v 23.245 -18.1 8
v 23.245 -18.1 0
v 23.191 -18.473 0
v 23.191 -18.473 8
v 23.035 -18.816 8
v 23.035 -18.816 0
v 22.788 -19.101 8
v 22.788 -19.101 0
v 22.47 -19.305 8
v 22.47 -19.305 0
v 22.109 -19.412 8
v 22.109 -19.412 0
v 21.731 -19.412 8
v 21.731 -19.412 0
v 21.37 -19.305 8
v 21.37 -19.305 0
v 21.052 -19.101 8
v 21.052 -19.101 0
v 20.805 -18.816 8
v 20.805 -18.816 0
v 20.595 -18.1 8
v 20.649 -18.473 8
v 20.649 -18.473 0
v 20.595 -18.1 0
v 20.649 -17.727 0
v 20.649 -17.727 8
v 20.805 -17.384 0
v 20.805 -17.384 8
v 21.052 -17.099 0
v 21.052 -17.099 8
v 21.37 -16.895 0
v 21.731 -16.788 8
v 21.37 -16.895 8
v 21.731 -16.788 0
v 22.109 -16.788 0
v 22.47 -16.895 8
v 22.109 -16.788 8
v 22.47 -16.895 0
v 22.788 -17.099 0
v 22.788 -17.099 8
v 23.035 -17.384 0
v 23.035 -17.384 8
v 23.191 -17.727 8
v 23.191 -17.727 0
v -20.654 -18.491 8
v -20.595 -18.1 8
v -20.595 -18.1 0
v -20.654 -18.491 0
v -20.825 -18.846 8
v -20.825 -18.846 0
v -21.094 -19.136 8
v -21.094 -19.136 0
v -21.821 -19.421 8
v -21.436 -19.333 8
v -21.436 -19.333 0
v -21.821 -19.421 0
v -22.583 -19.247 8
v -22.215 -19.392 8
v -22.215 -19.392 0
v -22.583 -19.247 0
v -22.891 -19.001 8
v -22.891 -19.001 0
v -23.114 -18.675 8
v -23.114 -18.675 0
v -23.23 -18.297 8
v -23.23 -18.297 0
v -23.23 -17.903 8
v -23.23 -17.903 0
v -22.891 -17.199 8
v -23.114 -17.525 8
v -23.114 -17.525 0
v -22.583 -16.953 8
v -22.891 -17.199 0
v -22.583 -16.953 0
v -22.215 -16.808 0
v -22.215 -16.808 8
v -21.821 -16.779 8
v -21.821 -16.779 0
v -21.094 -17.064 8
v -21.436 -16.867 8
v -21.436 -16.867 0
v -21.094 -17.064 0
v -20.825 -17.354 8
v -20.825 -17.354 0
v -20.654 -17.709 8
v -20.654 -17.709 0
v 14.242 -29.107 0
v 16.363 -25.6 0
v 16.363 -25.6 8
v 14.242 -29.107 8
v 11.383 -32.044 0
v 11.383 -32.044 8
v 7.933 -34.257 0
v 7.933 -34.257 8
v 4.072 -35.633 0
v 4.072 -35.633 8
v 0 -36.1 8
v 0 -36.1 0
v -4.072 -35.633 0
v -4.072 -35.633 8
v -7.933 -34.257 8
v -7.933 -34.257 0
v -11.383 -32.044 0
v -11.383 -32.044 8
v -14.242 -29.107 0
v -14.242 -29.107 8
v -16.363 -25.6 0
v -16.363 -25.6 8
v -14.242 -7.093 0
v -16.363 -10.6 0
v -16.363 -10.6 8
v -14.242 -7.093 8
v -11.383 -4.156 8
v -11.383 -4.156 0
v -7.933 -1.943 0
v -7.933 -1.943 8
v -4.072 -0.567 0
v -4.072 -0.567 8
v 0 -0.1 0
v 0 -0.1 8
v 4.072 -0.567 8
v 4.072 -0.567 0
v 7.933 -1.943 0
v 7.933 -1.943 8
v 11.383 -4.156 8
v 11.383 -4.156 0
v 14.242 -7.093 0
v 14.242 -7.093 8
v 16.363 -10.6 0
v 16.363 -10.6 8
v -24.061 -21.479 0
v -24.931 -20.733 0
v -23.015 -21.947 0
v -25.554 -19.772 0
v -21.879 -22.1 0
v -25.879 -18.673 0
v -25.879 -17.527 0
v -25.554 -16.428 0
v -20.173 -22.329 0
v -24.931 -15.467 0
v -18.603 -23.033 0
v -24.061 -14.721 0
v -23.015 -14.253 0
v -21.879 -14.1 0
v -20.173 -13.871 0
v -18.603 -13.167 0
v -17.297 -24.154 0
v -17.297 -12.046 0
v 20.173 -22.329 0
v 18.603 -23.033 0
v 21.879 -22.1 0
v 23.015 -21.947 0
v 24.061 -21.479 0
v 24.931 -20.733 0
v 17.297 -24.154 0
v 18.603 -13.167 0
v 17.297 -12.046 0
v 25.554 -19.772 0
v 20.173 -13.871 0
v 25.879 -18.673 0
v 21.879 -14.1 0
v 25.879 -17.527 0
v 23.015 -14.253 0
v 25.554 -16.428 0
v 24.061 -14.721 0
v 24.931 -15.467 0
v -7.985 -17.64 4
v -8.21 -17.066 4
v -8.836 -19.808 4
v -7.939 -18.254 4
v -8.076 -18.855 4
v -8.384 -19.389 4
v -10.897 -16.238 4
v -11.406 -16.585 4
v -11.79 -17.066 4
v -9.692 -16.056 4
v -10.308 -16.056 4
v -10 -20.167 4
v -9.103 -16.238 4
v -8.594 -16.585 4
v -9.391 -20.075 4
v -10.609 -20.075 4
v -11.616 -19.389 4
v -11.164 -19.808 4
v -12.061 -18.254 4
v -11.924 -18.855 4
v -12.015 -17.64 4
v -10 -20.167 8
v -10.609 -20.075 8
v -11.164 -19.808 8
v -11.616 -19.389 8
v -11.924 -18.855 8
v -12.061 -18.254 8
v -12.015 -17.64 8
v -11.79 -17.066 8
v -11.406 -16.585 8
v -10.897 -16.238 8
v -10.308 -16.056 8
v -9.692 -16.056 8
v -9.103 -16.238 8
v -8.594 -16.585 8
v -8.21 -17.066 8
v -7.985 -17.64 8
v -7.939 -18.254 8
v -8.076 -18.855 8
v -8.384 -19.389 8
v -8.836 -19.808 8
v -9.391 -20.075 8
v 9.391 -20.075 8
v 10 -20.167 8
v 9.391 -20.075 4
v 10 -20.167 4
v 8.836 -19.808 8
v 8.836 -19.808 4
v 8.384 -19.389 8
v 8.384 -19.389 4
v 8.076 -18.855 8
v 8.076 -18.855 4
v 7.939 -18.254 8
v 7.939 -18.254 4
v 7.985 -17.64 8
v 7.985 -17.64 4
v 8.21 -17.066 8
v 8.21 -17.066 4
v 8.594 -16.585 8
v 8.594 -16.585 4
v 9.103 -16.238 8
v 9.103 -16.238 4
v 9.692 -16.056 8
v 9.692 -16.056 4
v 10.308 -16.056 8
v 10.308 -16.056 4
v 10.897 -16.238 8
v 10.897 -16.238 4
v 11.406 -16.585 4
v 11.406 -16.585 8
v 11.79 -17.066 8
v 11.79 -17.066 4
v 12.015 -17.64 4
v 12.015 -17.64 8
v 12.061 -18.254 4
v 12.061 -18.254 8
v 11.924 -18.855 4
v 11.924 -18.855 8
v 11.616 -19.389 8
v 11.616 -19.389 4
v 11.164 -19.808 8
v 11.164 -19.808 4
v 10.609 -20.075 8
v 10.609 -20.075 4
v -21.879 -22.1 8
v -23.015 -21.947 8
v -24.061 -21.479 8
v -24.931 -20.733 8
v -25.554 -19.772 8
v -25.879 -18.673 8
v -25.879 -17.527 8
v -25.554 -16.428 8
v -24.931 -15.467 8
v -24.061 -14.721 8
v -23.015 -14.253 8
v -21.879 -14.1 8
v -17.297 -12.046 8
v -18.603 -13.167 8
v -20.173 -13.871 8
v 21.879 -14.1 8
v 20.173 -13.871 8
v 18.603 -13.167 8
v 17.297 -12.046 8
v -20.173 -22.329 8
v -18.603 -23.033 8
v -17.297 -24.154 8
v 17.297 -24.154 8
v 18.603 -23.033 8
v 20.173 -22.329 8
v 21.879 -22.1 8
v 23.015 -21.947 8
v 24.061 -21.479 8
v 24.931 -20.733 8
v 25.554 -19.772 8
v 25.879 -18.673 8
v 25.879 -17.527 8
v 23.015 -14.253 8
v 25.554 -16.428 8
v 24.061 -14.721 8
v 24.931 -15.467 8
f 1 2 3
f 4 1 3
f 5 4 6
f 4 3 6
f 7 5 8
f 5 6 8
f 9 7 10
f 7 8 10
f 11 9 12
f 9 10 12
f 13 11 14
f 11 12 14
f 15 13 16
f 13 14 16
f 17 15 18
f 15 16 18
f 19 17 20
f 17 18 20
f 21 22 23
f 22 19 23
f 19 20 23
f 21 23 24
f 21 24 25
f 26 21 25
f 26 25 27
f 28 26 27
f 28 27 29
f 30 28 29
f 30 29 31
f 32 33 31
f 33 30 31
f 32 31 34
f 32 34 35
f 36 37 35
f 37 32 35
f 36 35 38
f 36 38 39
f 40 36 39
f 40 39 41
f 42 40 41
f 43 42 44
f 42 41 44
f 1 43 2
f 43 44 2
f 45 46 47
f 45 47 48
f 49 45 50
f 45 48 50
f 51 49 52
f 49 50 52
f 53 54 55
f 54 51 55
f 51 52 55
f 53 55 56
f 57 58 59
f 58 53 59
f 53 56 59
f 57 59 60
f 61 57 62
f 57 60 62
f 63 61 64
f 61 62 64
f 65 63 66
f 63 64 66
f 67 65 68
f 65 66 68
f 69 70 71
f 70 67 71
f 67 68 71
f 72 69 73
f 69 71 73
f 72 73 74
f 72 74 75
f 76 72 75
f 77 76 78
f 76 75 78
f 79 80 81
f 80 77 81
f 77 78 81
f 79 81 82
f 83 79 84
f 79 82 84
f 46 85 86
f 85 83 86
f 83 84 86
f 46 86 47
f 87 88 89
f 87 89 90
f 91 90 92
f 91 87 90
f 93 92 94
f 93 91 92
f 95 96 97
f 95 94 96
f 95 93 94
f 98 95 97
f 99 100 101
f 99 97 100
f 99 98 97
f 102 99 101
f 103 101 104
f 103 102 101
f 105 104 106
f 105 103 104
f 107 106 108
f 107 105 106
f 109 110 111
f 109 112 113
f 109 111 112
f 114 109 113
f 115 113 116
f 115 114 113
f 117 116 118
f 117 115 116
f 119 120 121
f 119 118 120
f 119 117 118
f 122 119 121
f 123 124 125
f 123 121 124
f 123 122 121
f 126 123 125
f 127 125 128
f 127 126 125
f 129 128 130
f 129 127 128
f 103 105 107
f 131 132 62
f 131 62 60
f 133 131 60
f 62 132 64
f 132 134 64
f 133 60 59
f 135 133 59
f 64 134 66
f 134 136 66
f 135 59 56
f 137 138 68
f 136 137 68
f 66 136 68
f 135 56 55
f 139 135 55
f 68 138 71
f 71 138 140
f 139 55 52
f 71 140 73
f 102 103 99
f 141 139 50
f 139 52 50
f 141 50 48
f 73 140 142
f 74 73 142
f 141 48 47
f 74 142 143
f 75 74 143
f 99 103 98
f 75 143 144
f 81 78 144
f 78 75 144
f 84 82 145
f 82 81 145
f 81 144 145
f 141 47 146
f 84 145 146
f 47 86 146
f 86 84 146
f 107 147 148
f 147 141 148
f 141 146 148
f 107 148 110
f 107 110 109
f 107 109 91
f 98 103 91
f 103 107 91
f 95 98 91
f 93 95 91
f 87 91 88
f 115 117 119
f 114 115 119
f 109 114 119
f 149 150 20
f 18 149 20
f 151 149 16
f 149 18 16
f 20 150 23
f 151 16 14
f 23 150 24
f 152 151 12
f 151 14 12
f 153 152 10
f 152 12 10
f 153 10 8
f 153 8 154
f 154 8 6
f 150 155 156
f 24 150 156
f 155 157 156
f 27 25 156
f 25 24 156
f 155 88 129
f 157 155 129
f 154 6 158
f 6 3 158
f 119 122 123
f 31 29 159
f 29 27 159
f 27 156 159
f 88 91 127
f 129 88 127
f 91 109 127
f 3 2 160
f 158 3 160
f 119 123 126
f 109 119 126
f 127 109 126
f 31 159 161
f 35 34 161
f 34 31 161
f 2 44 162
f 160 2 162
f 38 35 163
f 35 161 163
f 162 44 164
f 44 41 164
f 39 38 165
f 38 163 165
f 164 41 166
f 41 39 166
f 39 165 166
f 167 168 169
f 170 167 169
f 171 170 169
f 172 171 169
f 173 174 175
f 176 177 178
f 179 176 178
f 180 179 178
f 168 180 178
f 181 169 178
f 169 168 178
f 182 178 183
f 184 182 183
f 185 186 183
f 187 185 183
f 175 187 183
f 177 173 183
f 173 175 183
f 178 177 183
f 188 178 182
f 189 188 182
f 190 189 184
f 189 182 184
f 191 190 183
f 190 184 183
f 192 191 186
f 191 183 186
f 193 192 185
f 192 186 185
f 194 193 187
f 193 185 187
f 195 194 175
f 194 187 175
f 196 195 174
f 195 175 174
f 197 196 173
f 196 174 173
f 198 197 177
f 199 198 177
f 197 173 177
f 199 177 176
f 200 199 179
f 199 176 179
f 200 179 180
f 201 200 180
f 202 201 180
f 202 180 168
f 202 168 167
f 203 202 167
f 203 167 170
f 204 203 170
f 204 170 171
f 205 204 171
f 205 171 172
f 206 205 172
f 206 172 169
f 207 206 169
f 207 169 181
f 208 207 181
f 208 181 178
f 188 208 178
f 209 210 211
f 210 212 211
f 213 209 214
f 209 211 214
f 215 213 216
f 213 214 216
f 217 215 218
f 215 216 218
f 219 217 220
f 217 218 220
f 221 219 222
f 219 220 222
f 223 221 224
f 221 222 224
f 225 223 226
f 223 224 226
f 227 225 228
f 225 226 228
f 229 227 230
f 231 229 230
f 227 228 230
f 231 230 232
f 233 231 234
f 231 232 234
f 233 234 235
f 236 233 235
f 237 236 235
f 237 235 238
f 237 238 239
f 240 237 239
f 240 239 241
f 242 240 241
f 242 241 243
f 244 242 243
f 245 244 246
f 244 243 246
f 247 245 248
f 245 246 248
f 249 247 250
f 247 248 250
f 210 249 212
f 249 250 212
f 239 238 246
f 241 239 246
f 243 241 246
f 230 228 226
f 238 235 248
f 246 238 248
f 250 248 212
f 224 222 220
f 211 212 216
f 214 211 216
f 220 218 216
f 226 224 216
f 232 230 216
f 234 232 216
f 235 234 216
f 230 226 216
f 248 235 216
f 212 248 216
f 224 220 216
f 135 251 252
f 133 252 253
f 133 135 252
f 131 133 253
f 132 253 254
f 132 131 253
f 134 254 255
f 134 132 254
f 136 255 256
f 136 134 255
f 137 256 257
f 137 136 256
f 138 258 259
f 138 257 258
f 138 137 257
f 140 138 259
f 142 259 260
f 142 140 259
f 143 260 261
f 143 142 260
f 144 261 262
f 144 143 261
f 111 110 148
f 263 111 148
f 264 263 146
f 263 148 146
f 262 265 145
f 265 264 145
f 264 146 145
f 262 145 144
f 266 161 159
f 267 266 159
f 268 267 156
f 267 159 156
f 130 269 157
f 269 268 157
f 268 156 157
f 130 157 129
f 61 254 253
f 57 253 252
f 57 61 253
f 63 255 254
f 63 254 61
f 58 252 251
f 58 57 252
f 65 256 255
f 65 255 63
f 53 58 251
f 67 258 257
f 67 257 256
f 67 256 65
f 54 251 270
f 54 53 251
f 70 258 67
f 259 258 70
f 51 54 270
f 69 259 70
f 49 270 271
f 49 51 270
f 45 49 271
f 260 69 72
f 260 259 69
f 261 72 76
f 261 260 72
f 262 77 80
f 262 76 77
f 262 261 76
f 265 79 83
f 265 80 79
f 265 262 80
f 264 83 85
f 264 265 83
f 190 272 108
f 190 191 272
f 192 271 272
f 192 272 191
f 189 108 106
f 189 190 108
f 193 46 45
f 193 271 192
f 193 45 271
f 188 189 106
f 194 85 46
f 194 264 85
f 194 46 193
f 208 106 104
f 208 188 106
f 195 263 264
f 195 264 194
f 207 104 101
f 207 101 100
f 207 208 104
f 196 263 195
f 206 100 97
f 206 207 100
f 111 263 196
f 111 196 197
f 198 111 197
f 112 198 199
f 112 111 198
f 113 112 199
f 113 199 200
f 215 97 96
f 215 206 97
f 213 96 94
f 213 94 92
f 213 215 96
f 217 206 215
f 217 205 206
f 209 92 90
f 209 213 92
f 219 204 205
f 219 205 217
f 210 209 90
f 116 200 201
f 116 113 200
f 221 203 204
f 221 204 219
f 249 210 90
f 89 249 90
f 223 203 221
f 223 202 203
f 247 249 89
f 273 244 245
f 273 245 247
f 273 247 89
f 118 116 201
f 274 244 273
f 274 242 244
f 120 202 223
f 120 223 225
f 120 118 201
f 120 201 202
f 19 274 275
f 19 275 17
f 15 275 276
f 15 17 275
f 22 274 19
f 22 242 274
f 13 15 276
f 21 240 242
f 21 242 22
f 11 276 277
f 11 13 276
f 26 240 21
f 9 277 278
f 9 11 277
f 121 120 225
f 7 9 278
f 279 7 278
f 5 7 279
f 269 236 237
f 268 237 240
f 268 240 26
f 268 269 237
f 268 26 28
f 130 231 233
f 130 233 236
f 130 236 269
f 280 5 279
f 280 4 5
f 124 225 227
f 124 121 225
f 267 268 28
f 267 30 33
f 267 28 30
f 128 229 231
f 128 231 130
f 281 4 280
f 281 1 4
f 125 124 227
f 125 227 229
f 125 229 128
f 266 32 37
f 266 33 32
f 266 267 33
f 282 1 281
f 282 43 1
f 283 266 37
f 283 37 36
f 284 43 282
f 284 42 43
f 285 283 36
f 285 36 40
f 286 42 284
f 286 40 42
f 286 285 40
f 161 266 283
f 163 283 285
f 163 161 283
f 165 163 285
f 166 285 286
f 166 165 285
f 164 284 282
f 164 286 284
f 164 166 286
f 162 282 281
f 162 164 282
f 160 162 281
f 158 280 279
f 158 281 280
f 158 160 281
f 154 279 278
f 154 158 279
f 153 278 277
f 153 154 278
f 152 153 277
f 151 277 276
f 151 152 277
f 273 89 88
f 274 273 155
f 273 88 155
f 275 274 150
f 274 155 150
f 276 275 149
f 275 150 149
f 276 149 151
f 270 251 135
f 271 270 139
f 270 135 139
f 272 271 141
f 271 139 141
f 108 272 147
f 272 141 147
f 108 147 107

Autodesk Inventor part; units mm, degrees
ref_plane "YZ Plane" through (0, 0, 0) normal (1, 0, 0) x (0, 1, 0)
ref_plane "XZ Plane" through (0, 0, 0) normal (0, 1, 0) x (-1, 0, 0)
ref_plane "XY Plane" through (0, 0, 0) normal (0, 0, 1) x (1, 0, 0)
sketch "Sketch1" plane through (0, 0, 0) normal (0, 0, 1) x (1, 0, 0)
  circle A0 centre (0, -18.1) radius 17.9 projected
  circle A1 centre (0, -18.1) radius 2.9 projected
  circle A2 centre (-13.5, -18.1) radius 1.525 projected
  circle A3 centre (13.5, -18.1) radius 1.525 projected
  circle A4 centre (0, -18.1) radius 18
  arc A5 (23.0705, -21.2782) -> (23.0705, -14.9218) centre (21.92, -18.1) ccw projected
  line L0 (23.0705, -14.9218) -> (17.5529, -12.9245) projected
  arc A6 (17.5529, -23.2755) -> (17.5529, -12.9245) centre (0, -18.1) ccw projected
  line L1 (17.5529, -23.2755) -> (23.0705, -21.2782) projected
  circle A7 centre (21.92, -18.1) radius 1.325 projected
  arc A8 (-23.0705, -14.9218) -> (-23.0705, -21.2782) centre (-21.92, -18.1) ccw projected
  line L2 (-23.0705, -21.2782) -> (-17.5529, -23.2755) projected
  arc A9 (-17.5529, -12.9245) -> (-17.5529, -23.2755) centre (0, -18.1) ccw projected
  line L3 (-17.5529, -12.9245) -> (-23.0705, -14.9218) projected
  circle A10 centre (-21.92, -18.1) radius 1.325 projected
  line L4 (0, -18.1) -> (-21.92, -18.1)
  line L5 (-21.92, -18.1) -> (21.92, -18.1)
  circle A11 centre (21.92, -18.1) radius 4
  circle A12 centre (-21.92, -18.1) radius 4
  circle A13 centre (21.8177, -28.0995) radius 6
  circle A14 centre (21.8177, -8.1005) radius 6
  circle A15 centre (-21.8177, -28.0995) radius 6
  circle A16 centre (-21.8177, -8.1005) radius 6
  point P0 (0, 0)
  point P1 (16.3632, -25.5996)
  point P2 (21.8791, -22.0998)
  point P3 (21.8791, -14.1002)
  point P4 (16.3632, -10.6004)
  point P5 (-16.3632, -10.6004)
  point P6 (-21.8791, -14.1002)
  point P7 (-21.8791, -22.0998)
  point P8 (-16.3632, -25.5996)
  dimension "d0" = 36
  dimension "d1" = 8
  dimension "d2" = 8
  dimension "d3" = 12
  dimension "d4" = 12
  dimension "d5" = 12
  dimension "d6" = 12
extrude "Extrusion1" add sketch "Sketch1" along normal blind 8 contours L5 A3 A1 L4 A2 A0 | L5 A11 A4 A12 L4 A0 | A0 L4 A2 A1 L5 A3 | A0 L4 A12 A4 A11 L5 | L5 A3 | A3 L5 | A11 A4 L5 | L5 A4 A11 | L4 A2 | A2 L4 | A12 A4 L4 | L4 A4 A12 | L5 A6 A11 A4 | A4 A11 A6 L5 | A4 A14 L0 A6 A11 | A11 A6 L1 A13 A4 | L4 A9 A12 A4 | A4 A12 A9 L4 | A12 A9 L3 A16 A4 | A4 A15 L2 A9 A12 | L5 L4 A1 | A1 L4 L5 | A6 A11 L0 A5 L1 | A6 L0 A14 A11 | A11 L1 A13 A6 | A9 A12 L2 A8 L3 | A12 L3 A16 A9 | A9 L2 A15 A12 | A11 L1 A5 L0 | L0 A14 A11 | A11 A13 L1 | A12 A16 L3 | L3 A8 L2 A12 | L2 A15 A12
sketch "Sketch2" plane through (0, 0, 8) normal (0, 0, 1) x (1, 0, 0)
  circle A0 centre (21.92, -18.1) radius 1.325 projected
  circle A1 centre (-21.92, -18.1) radius 1.325 projected
  line L0 (21.92, -18.1) -> (-21.92, -18.1)
  line L1 (0, -18.1) -> (-10, -18.1)
  line L2 (0, -18.1) -> (10, -18.1)
  point P0 (0, 0)
  dimension "d9" = 10
  dimension "d10" = 10
hole "Hole1" at (10, -18.1, 8) at (-10, -18.1, 8) direction (0, 0, -1) diameter 4.134 depth 4 thread size "M5x0.8" class "6H" standard "ISO Metric profile"
properties part number "extruder waterblock"
